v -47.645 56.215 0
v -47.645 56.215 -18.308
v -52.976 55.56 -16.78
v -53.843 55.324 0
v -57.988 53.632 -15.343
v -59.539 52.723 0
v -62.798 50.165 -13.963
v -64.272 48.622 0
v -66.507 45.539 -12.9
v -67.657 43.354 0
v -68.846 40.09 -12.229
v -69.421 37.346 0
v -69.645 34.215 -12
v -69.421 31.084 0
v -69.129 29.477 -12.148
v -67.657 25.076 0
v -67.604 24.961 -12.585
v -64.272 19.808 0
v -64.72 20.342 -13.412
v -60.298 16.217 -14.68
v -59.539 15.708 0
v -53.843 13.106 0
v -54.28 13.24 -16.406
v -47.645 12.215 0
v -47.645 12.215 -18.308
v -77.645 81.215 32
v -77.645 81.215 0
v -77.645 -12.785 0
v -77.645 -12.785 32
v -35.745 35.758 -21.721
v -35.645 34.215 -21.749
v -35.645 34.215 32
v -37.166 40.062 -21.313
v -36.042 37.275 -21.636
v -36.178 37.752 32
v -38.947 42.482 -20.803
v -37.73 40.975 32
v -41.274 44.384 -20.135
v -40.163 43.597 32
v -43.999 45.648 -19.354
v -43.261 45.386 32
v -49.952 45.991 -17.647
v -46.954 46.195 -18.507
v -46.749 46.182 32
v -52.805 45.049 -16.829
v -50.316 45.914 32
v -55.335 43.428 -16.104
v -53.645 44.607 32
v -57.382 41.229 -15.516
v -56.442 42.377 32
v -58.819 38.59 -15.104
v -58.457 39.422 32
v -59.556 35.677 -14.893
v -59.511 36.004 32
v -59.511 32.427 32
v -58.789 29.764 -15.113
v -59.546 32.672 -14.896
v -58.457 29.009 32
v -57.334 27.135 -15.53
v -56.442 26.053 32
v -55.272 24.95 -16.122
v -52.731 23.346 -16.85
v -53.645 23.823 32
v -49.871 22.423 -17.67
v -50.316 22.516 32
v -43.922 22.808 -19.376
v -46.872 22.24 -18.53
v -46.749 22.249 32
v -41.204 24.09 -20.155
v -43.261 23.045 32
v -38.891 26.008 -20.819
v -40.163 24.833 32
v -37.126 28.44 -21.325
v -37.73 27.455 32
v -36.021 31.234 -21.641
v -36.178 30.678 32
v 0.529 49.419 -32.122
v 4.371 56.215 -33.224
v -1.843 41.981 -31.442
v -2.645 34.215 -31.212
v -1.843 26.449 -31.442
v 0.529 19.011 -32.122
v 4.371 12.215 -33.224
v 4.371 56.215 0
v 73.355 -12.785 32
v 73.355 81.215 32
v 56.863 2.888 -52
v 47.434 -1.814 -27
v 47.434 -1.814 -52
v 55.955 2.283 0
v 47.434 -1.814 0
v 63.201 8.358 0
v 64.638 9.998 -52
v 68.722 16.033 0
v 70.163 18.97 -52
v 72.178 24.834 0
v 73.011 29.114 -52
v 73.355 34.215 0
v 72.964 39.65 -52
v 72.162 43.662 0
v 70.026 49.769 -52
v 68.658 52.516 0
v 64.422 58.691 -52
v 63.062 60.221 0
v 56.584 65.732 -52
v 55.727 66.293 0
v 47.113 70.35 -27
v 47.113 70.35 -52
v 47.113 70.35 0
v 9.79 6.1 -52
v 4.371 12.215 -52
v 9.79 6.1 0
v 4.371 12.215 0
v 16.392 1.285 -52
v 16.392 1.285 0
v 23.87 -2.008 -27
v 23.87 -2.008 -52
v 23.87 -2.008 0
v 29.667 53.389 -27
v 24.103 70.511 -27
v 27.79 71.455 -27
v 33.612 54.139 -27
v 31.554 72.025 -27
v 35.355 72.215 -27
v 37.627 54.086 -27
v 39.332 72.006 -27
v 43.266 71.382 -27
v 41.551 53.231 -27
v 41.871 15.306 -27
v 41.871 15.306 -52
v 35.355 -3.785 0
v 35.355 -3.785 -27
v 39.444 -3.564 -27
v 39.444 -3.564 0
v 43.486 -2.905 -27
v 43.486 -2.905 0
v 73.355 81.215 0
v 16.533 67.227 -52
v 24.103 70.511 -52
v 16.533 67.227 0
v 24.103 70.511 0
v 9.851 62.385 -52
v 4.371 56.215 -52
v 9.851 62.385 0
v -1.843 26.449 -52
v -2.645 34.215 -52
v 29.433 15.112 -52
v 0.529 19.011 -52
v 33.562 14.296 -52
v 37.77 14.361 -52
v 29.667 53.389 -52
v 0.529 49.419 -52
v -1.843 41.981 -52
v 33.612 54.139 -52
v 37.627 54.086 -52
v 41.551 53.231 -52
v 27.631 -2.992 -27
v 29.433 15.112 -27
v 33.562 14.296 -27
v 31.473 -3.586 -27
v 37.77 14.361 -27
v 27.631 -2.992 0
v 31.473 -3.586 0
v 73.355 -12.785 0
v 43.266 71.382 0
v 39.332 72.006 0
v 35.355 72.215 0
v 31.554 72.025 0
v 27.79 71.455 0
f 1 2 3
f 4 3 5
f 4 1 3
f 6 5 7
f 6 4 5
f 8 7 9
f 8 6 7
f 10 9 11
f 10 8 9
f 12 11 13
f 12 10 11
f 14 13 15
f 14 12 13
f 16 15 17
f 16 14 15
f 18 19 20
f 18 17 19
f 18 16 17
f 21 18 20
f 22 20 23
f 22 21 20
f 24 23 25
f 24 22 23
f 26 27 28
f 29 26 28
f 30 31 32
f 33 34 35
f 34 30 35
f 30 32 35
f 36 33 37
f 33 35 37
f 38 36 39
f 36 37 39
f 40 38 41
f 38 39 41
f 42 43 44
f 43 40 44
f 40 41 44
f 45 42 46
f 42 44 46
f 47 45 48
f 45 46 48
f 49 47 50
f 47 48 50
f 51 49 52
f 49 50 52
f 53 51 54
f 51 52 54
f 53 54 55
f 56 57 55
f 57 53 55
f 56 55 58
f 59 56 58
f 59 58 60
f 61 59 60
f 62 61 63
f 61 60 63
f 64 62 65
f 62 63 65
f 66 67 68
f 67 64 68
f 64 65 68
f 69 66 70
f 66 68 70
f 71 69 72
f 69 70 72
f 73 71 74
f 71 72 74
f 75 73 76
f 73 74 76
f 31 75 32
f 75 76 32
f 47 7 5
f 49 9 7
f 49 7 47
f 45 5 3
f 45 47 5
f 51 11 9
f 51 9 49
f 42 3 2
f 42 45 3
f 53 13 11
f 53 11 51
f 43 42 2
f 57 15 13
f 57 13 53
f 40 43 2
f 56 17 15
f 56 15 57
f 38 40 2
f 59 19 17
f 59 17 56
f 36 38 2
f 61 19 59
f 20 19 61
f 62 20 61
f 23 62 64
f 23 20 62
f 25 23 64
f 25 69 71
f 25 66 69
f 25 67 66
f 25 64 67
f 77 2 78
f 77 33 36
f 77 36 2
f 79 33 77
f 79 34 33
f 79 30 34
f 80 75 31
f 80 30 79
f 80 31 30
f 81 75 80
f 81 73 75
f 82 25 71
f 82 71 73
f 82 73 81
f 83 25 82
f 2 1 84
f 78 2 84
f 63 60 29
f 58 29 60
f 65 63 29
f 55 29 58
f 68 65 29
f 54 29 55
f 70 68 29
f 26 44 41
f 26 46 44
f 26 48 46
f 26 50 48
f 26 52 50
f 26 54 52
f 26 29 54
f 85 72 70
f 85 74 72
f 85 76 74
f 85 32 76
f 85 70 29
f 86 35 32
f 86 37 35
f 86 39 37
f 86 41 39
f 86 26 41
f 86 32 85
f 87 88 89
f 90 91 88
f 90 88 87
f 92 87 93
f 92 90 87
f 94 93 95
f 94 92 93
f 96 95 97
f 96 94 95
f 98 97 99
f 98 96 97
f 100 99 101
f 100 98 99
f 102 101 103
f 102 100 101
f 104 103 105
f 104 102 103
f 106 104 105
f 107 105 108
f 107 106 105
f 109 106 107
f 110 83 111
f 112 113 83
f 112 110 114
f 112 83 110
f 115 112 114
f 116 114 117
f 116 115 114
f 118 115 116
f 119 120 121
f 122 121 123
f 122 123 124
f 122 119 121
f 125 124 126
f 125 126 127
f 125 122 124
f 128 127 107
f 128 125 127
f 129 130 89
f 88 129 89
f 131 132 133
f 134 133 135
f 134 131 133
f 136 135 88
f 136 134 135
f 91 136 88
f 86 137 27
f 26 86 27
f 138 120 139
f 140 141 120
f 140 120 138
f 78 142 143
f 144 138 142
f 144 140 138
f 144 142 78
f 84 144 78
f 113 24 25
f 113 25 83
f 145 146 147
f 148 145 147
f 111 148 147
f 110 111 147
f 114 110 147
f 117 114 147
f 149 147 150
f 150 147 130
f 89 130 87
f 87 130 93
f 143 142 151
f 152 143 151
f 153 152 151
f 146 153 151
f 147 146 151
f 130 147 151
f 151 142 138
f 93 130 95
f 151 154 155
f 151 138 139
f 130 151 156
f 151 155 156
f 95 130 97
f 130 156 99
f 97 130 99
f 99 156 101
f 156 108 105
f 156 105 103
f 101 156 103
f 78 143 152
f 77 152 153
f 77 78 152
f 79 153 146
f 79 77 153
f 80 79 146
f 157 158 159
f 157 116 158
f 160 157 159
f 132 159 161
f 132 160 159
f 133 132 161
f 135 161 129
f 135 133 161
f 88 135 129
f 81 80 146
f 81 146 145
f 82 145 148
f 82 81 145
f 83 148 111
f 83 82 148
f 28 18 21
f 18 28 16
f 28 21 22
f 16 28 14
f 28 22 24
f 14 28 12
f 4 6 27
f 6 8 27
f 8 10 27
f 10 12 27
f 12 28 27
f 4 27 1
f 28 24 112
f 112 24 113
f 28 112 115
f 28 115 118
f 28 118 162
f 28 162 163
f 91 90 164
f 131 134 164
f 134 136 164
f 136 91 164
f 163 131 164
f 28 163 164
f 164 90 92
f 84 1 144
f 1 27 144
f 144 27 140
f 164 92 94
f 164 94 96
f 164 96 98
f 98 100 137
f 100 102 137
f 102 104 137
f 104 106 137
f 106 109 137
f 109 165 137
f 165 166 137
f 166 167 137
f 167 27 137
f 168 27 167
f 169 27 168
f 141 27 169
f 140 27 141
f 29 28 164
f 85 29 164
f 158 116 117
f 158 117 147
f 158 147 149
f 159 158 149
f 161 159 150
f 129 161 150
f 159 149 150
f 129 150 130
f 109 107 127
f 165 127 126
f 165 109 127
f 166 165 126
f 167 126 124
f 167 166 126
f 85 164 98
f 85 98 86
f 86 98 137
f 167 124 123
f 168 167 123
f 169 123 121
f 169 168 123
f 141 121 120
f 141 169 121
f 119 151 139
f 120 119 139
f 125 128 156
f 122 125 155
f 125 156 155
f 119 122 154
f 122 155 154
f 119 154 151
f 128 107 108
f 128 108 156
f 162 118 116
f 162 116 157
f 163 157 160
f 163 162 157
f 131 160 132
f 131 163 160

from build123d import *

# Parameters (mm, degrees)
F0_R      = 12
F1_DEPTH  = 32
F2_DEPTH  = 12
F3_DEPTH  = 52
F5_DEPTH  = 44
F6_DEPTH  = 93.7
F7_R      = 12
F8_DEPTH  = 98.4
F9_DEPTH  = 52
F11_DEPTH = 25


# Not quite as in the source:
# - a feature names something its author has since deleted; it is built from what else it names


with BuildPart() as f1:
    # F0 (on Top) → F1 (new body)
    with BuildSketch(Plane.XY):
        with BuildLine():
            Line((35.3547130823, 81.2151380405), (-47.6452869177, 81.2151380405))
            Line((-47.6452869177, 81.2151380405), (-47.6452869177, 56.2151380405))
            Line((-47.6452869177, 56.2151380405), (4.3708463127, 56.2151380405))
            ThreePointArc((4.3708463127, 56.2151380405), (13.0601260183, 64.9877132925), (24.1033321201, 70.5112318584))
            ThreePointArc((24.1033321201, 70.5112318584), (29.6648785101, 71.7867467702), (35.3547130823, 72.2151380405))
            Line((35.3547130823, 72.2151380405), (35.3547130823, 81.2151380405))
        make_face()
        with BuildLine():
            Line((-47.6452869177, 81.2151380405), (-77.6452869177, 81.2151380405))
            Line((-77.6452869177, 81.2151380405), (-77.6452869177, -12.7848619595))
            Line((-77.6452869177, -12.7848619595), (-47.6452869177, -12.7848619595))
            Line((-47.6452869177, -12.7848619595), (35.3547130823, -12.7848619595))
            Line((35.3547130823, -12.7848619595), (35.3547130823, -3.7848619595))
            ThreePointArc((35.3547130823, -3.7848619595), (29.5441458382, -3.3379884379), (23.8702411544, -2.0078781859))
            ThreePointArc((23.8702411544, -2.0078781859), (12.9613324626, 3.5143806488), (4.3708463127, 12.2151380405))
            Line((4.3708463127, 12.2151380405), (-47.6452869177, 12.2151380405))
            ThreePointArc((-47.6452869177, 12.2151380405), (-69.6452869177, 34.2151380405), (-47.6452869177, 56.2151380405))
            Line((-47.6452869177, 56.2151380405), (-47.6452869177, 81.2151380405))
        make_face()
        with BuildLine():
            Line((4.3708463127, 56.2151380405), (-47.6452869177, 56.2151380405))
            ThreePointArc((-47.6452869177, 56.2151380405), (-32.0889377316, 49.7714872266), (-25.6452869177, 34.2151380405))
            Line((-25.6452869177, 34.2151380405), (-2.6452869177, 34.2151380405))
            ThreePointArc((-2.6452869177, 34.2151380405), (-0.8487876963, 45.7609828072), (4.3708463127, 56.2151380405))
        make_face()
        with BuildLine():
            Line((-2.6452869177, 34.2151380405), (-25.6452869177, 34.2151380405))
            ThreePointArc((-25.6452869177, 34.2151380405), (-32.0889377316, 18.6587888544), (-47.6452869177, 12.2151380405))
            Line((-47.6452869177, 12.2151380405), (4.3708463127, 12.2151380405))
            ThreePointArc((4.3708463127, 12.2151380405), (-0.8487876963, 22.6692932738), (-2.6452869177, 34.2151380405))
        make_face()
        with BuildLine():
            ThreePointArc((-25.6452869177, 34.2151380405), (-32.0889377316, 49.7714872266), (-47.6452869177, 56.2151380405))
            ThreePointArc((-47.6452869177, 56.2151380405), (-69.6452869177, 34.2151380405), (-47.6452869177, 12.2151380405))
            ThreePointArc((-47.6452869177, 12.2151380405), (-32.0889377316, 18.6587888544), (-25.6452869177, 34.2151380405))
        make_face()
        with Locations((-47.6452869177, 34.2151380405)):
            Circle(F0_R, mode=Mode.SUBTRACT)
        with Locations((-47.6452869177, 34.2151380405)):
            Circle(F0_R)
        with BuildLine():
            ThreePointArc((24.1033321201, 70.5112318584), (13.0601260183, 64.9877132925), (4.3708463127, 56.2151380405))
            ThreePointArc((4.3708463127, 56.2151380405), (-0.8487876963, 45.7609828072), (-2.6452869177, 34.2151380405))
            ThreePointArc((-2.6452869177, 34.2151380405), (-0.8487876963, 22.6692932738), (4.3708463127, 12.2151380405))
            ThreePointArc((4.3708463127, 12.2151380405), (12.9613324626, 3.5143806488), (23.8702411544, -2.0078781859))
            Line((23.8702411544, -2.0078781859), (29.4328161154, 15.111967196))
            ThreePointArc((29.4328161154, 15.111967196), (32.3600024861, 14.440616341), (35.3547130823, 14.2151380405))
            Line((35.3547130823, 14.2151380405), (35.3547130823, 54.2151380405))
            ThreePointArc((35.3547130823, 54.2151380405), (32.4808372386, 54.0075819935), (29.6666104259, 53.389221804))
            Line((29.6666104259, 53.389221804), (24.1033321201, 70.5112318584))
        make_face()
        with BuildLine():
            ThreePointArc((47.4336065252, -1.8140214445), (66.2010901048, 12.0227739351), (73.3547130823, 34.2151380405))
            ThreePointArc((73.3547130823, 34.2151380405), (66.1022036315, 56.5443078622), (47.1130380862, 70.3501874123))
            Line((47.1130380862, 70.3501874123), (41.5507311927, 53.2311670575))
            ThreePointArc((41.5507311927, 53.2311670575), (38.4915442588, 53.9676135858), (35.3547130823, 54.2151380405))
            Line((35.3547130823, 54.2151380405), (35.3547130823, 14.2151380405))
            ThreePointArc((35.3547130823, 14.2151380405), (38.6581508077, 14.4898421189), (41.8708417514, 15.306408121))
            Line((41.8708417514, 15.306408121), (47.4336065252, -1.8140214445))
        make_face()
        with BuildLine():
            Line((73.3547130823, 81.2151380405), (35.3547130823, 81.2151380405))
            Line((35.3547130823, 81.2151380405), (35.3547130823, 72.2151380405))
            ThreePointArc((35.3547130823, 72.2151380405), (41.3073647549, 71.7460045115), (47.1130380862, 70.3501874123))
            ThreePointArc((47.1130380862, 70.3501874123), (66.1022036315, 56.5443078622), (73.3547130823, 34.2151380405))
            Line((73.3547130823, 34.2151380405), (73.3547130823, 81.2151380405))
        make_face()
        with BuildLine():
            Line((35.3547130823, 14.2151380405), (35.3547130823, -3.7848619595))
            ThreePointArc((35.3547130823, -3.7848619595), (41.4740243005, -3.2889154766), (47.4336065252, -1.8140214445))
            Line((47.4336065252, -1.8140214445), (41.8708417514, 15.306408121))
            ThreePointArc((41.8708417514, 15.306408121), (38.6581508077, 14.4898421189), (35.3547130823, 14.2151380405))
        make_face()
        with BuildLine():
            ThreePointArc((23.8702411544, -2.0078781859), (29.5441458382, -3.3379884379), (35.3547130823, -3.7848619595))
            Line((35.3547130823, -3.7848619595), (35.3547130823, 14.2151380405))
            ThreePointArc((35.3547130823, 14.2151380405), (32.3600024861, 14.440616341), (29.4328161154, 15.111967196))
            Line((29.4328161154, 15.111967196), (23.8702411544, -2.0078781859))
        make_face()
        with BuildLine():
            Line((35.3547130823, 54.2151380405), (35.3547130823, 72.2151380405))
            ThreePointArc((35.3547130823, 72.2151380405), (29.6648785101, 71.7867467702), (24.1033321201, 70.5112318584))
            Line((24.1033321201, 70.5112318584), (29.6666104259, 53.389221804))
            ThreePointArc((29.6666104259, 53.389221804), (32.4808372386, 54.0075819935), (35.3547130823, 54.2151380405))
        make_face()
        with BuildLine():
            ThreePointArc((47.1130380862, 70.3501874123), (41.3073647549, 71.7460045115), (35.3547130823, 72.2151380405))
            Line((35.3547130823, 72.2151380405), (35.3547130823, 54.2151380405))
            ThreePointArc((35.3547130823, 54.2151380405), (38.4915442588, 53.9676135858), (41.5507311927, 53.2311670575))
            Line((41.5507311927, 53.2311670575), (47.1130380862, 70.3501874123))
        make_face()
        with BuildLine():
            Line((35.3547130823, -3.7848619595), (35.3547130823, -12.7848619595))
            Line((35.3547130823, -12.7848619595), (73.3547130823, -12.7848619595))
            Line((73.3547130823, -12.7848619595), (73.3547130823, 34.2151380405))
            ThreePointArc((73.3547130823, 34.2151380405), (66.2010901048, 12.0227739351), (47.4336065252, -1.8140214445))
            ThreePointArc((47.4336065252, -1.8140214445), (41.4740243005, -3.2889154766), (35.3547130823, -3.7848619595))
        make_face()
    extrude(amount=F1_DEPTH)

    # F0 (on Top) → F2 (join)
    with BuildSketch(Plane.XY):
        with BuildLine():
            ThreePointArc((-25.6452869177, 34.2151380405), (-32.0889377316, 49.7714872266), (-47.6452869177, 56.2151380405))
            ThreePointArc((-47.6452869177, 56.2151380405), (-69.6452869177, 34.2151380405), (-47.6452869177, 12.2151380405))
            ThreePointArc((-47.6452869177, 12.2151380405), (-32.0889377316, 18.6587888544), (-25.6452869177, 34.2151380405))
        make_face()
        with Locations((-47.6452869177, 34.2151380405)):
            Circle(F0_R, mode=Mode.SUBTRACT)
        with BuildLine():
            Line((-2.6452869177, 34.2151380405), (-25.6452869177, 34.2151380405))
            ThreePointArc((-25.6452869177, 34.2151380405), (-32.0889377316, 18.6587888544), (-47.6452869177, 12.2151380405))
            Line((-47.6452869177, 12.2151380405), (4.3708463127, 12.2151380405))
            ThreePointArc((4.3708463127, 12.2151380405), (-0.8487876963, 22.6692932738), (-2.6452869177, 34.2151380405))
        make_face()
        with BuildLine():
            Line((4.3708463127, 56.2151380405), (-47.6452869177, 56.2151380405))
            ThreePointArc((-47.6452869177, 56.2151380405), (-32.0889377316, 49.7714872266), (-25.6452869177, 34.2151380405))
            Line((-25.6452869177, 34.2151380405), (-2.6452869177, 34.2151380405))
            ThreePointArc((-2.6452869177, 34.2151380405), (-0.8487876963, 45.7609828072), (4.3708463127, 56.2151380405))
        make_face()
    extrude(amount=-F2_DEPTH)

    # F0 (on Top) → F3 (join)
    with BuildSketch(Plane.XY):
        with BuildLine():
            ThreePointArc((47.4336065252, -1.8140214445), (66.2010901048, 12.0227739351), (73.3547130823, 34.2151380405))
            ThreePointArc((73.3547130823, 34.2151380405), (66.1022036315, 56.5443078622), (47.1130380862, 70.3501874123))
            Line((47.1130380862, 70.3501874123), (41.5507311927, 53.2311670575))
            ThreePointArc((41.5507311927, 53.2311670575), (38.4915442588, 53.9676135858), (35.3547130823, 54.2151380405))
            Line((35.3547130823, 54.2151380405), (35.3547130823, 14.2151380405))
            ThreePointArc((35.3547130823, 14.2151380405), (38.6581508077, 14.4898421189), (41.8708417514, 15.306408121))
            Line((41.8708417514, 15.306408121), (47.4336065252, -1.8140214445))
        make_face()
        with BuildLine():
            ThreePointArc((24.1033321201, 70.5112318584), (13.0601260183, 64.9877132925), (4.3708463127, 56.2151380405))
            ThreePointArc((4.3708463127, 56.2151380405), (-0.8487876963, 45.7609828072), (-2.6452869177, 34.2151380405))
            ThreePointArc((-2.6452869177, 34.2151380405), (-0.8487876963, 22.6692932738), (4.3708463127, 12.2151380405))
            ThreePointArc((4.3708463127, 12.2151380405), (12.9613324626, 3.5143806488), (23.8702411544, -2.0078781859))
            Line((23.8702411544, -2.0078781859), (29.4328161154, 15.111967196))
            ThreePointArc((29.4328161154, 15.111967196), (32.3600024861, 14.440616341), (35.3547130823, 14.2151380405))
            Line((35.3547130823, 14.2151380405), (35.3547130823, 54.2151380405))
            ThreePointArc((35.3547130823, 54.2151380405), (32.4808372386, 54.0075819935), (29.6666104259, 53.389221804))
            Line((29.6666104259, 53.389221804), (24.1033321201, 70.5112318584))
        make_face()
    extrude(amount=-F3_DEPTH)

    # F4 (on face) → F5 (join)
    with BuildSketch(Plane.XZ.offset(-12.2151380405)):
        Polygon((-47.6452869177, -12), (-69.6452869177, -12), (4.3708463127, -33.2237846755), (4.3708463127, -12), align=None)
    extrude(amount=-F5_DEPTH)

    # F6 (cut): faces of the model
    f6_faces = [f1.faces().sort_by_distance(p)[0] for p in [
        (-64.7311922609, 51.3010433837, -12),
        (-64.7311922609, 17.1292326973, -12),
    ]]
    extrude(f6_faces, amount=-F6_DEPTH, mode=Mode.SUBTRACT)

    # F7 (on face) → F8 (cut)
    with BuildSketch(Plane.XY.offset(32)):
        with Locations((-47.6452869177, 34.2151380405)):
            Circle(F7_R)
    extrude(amount=-F8_DEPTH, mode=Mode.SUBTRACT)

    # F0 (on Top) → F9 (join)
    with BuildSketch(Plane.XY):
        with BuildLine():
            ThreePointArc((47.1130380862, 70.3501874123), (41.3073647549, 71.7460045115), (35.3547130823, 72.2151380405))
            Line((35.3547130823, 72.2151380405), (35.3547130823, 54.2151380405))
            ThreePointArc((35.3547130823, 54.2151380405), (38.4915442588, 53.9676135858), (41.5507311927, 53.2311670575))
            Line((41.5507311927, 53.2311670575), (47.1130380862, 70.3501874123))
        make_face()
        with BuildLine():
            Line((35.3547130823, 54.2151380405), (35.3547130823, 72.2151380405))
            ThreePointArc((35.3547130823, 72.2151380405), (29.6648785101, 71.7867467702), (24.1033321201, 70.5112318584))
            Line((24.1033321201, 70.5112318584), (29.6666104259, 53.389221804))
            ThreePointArc((29.6666104259, 53.389221804), (32.4808372386, 54.0075819935), (35.3547130823, 54.2151380405))
        make_face()
        with BuildLine():
            Line((35.3547130823, 14.2151380405), (35.3547130823, -3.7848619595))
            ThreePointArc((35.3547130823, -3.7848619595), (41.4740243005, -3.2889154766), (47.4336065252, -1.8140214445))
            Line((47.4336065252, -1.8140214445), (41.8708417514, 15.306408121))
            ThreePointArc((41.8708417514, 15.306408121), (38.6581508077, 14.4898421189), (35.3547130823, 14.2151380405))
        make_face()
        with BuildLine():
            ThreePointArc((23.8702411544, -2.0078781859), (29.5441458382, -3.3379884379), (35.3547130823, -3.7848619595))
            Line((35.3547130823, -3.7848619595), (35.3547130823, 14.2151380405))
            ThreePointArc((35.3547130823, 14.2151380405), (32.3600024861, 14.440616341), (29.4328161154, 15.111967196))
            Line((29.4328161154, 15.111967196), (23.8702411544, -2.0078781859))
        make_face()
    extrude(amount=-F9_DEPTH)

    # F10 (on face) → F11 (cut)
    with BuildSketch(Plane(origin=(0, 0, -52), x_dir=(1, 0, 0), z_dir=(0, 0, -1))):
        with BuildLine():
            ThreePointArc((24.1033321201, -70.5112318584), (35.620667766, -72.2142073463), (47.1130380862, -70.3501874123))
            Line((47.1130380862, -70.3501874123), (41.5507311927, -53.2311670575))
            ThreePointArc((41.5507311927, -53.2311670575), (35.6206827287, -54.213369466), (29.6666104259, -53.389221804))
            Line((29.6666104259, -53.389221804), (24.1033321201, -70.5112318584))
        make_face()
        with BuildLine():
            ThreePointArc((29.4328161154, -15.111967196), (35.667330496, -14.2175814309), (41.8708417514, -15.306408121))
            Line((41.8708417514, -15.306408121), (47.4336065252, 1.8140214445))
            ThreePointArc((47.4336065252, 1.8140214445), (35.6673300099, 3.7835760253), (23.8702411544, 2.0078781859))
            Line((23.8702411544, 2.0078781859), (29.4328161154, -15.111967196))
        make_face()
    extrude(amount=-F11_DEPTH, mode=Mode.SUBTRACT)


solid = f1.part
